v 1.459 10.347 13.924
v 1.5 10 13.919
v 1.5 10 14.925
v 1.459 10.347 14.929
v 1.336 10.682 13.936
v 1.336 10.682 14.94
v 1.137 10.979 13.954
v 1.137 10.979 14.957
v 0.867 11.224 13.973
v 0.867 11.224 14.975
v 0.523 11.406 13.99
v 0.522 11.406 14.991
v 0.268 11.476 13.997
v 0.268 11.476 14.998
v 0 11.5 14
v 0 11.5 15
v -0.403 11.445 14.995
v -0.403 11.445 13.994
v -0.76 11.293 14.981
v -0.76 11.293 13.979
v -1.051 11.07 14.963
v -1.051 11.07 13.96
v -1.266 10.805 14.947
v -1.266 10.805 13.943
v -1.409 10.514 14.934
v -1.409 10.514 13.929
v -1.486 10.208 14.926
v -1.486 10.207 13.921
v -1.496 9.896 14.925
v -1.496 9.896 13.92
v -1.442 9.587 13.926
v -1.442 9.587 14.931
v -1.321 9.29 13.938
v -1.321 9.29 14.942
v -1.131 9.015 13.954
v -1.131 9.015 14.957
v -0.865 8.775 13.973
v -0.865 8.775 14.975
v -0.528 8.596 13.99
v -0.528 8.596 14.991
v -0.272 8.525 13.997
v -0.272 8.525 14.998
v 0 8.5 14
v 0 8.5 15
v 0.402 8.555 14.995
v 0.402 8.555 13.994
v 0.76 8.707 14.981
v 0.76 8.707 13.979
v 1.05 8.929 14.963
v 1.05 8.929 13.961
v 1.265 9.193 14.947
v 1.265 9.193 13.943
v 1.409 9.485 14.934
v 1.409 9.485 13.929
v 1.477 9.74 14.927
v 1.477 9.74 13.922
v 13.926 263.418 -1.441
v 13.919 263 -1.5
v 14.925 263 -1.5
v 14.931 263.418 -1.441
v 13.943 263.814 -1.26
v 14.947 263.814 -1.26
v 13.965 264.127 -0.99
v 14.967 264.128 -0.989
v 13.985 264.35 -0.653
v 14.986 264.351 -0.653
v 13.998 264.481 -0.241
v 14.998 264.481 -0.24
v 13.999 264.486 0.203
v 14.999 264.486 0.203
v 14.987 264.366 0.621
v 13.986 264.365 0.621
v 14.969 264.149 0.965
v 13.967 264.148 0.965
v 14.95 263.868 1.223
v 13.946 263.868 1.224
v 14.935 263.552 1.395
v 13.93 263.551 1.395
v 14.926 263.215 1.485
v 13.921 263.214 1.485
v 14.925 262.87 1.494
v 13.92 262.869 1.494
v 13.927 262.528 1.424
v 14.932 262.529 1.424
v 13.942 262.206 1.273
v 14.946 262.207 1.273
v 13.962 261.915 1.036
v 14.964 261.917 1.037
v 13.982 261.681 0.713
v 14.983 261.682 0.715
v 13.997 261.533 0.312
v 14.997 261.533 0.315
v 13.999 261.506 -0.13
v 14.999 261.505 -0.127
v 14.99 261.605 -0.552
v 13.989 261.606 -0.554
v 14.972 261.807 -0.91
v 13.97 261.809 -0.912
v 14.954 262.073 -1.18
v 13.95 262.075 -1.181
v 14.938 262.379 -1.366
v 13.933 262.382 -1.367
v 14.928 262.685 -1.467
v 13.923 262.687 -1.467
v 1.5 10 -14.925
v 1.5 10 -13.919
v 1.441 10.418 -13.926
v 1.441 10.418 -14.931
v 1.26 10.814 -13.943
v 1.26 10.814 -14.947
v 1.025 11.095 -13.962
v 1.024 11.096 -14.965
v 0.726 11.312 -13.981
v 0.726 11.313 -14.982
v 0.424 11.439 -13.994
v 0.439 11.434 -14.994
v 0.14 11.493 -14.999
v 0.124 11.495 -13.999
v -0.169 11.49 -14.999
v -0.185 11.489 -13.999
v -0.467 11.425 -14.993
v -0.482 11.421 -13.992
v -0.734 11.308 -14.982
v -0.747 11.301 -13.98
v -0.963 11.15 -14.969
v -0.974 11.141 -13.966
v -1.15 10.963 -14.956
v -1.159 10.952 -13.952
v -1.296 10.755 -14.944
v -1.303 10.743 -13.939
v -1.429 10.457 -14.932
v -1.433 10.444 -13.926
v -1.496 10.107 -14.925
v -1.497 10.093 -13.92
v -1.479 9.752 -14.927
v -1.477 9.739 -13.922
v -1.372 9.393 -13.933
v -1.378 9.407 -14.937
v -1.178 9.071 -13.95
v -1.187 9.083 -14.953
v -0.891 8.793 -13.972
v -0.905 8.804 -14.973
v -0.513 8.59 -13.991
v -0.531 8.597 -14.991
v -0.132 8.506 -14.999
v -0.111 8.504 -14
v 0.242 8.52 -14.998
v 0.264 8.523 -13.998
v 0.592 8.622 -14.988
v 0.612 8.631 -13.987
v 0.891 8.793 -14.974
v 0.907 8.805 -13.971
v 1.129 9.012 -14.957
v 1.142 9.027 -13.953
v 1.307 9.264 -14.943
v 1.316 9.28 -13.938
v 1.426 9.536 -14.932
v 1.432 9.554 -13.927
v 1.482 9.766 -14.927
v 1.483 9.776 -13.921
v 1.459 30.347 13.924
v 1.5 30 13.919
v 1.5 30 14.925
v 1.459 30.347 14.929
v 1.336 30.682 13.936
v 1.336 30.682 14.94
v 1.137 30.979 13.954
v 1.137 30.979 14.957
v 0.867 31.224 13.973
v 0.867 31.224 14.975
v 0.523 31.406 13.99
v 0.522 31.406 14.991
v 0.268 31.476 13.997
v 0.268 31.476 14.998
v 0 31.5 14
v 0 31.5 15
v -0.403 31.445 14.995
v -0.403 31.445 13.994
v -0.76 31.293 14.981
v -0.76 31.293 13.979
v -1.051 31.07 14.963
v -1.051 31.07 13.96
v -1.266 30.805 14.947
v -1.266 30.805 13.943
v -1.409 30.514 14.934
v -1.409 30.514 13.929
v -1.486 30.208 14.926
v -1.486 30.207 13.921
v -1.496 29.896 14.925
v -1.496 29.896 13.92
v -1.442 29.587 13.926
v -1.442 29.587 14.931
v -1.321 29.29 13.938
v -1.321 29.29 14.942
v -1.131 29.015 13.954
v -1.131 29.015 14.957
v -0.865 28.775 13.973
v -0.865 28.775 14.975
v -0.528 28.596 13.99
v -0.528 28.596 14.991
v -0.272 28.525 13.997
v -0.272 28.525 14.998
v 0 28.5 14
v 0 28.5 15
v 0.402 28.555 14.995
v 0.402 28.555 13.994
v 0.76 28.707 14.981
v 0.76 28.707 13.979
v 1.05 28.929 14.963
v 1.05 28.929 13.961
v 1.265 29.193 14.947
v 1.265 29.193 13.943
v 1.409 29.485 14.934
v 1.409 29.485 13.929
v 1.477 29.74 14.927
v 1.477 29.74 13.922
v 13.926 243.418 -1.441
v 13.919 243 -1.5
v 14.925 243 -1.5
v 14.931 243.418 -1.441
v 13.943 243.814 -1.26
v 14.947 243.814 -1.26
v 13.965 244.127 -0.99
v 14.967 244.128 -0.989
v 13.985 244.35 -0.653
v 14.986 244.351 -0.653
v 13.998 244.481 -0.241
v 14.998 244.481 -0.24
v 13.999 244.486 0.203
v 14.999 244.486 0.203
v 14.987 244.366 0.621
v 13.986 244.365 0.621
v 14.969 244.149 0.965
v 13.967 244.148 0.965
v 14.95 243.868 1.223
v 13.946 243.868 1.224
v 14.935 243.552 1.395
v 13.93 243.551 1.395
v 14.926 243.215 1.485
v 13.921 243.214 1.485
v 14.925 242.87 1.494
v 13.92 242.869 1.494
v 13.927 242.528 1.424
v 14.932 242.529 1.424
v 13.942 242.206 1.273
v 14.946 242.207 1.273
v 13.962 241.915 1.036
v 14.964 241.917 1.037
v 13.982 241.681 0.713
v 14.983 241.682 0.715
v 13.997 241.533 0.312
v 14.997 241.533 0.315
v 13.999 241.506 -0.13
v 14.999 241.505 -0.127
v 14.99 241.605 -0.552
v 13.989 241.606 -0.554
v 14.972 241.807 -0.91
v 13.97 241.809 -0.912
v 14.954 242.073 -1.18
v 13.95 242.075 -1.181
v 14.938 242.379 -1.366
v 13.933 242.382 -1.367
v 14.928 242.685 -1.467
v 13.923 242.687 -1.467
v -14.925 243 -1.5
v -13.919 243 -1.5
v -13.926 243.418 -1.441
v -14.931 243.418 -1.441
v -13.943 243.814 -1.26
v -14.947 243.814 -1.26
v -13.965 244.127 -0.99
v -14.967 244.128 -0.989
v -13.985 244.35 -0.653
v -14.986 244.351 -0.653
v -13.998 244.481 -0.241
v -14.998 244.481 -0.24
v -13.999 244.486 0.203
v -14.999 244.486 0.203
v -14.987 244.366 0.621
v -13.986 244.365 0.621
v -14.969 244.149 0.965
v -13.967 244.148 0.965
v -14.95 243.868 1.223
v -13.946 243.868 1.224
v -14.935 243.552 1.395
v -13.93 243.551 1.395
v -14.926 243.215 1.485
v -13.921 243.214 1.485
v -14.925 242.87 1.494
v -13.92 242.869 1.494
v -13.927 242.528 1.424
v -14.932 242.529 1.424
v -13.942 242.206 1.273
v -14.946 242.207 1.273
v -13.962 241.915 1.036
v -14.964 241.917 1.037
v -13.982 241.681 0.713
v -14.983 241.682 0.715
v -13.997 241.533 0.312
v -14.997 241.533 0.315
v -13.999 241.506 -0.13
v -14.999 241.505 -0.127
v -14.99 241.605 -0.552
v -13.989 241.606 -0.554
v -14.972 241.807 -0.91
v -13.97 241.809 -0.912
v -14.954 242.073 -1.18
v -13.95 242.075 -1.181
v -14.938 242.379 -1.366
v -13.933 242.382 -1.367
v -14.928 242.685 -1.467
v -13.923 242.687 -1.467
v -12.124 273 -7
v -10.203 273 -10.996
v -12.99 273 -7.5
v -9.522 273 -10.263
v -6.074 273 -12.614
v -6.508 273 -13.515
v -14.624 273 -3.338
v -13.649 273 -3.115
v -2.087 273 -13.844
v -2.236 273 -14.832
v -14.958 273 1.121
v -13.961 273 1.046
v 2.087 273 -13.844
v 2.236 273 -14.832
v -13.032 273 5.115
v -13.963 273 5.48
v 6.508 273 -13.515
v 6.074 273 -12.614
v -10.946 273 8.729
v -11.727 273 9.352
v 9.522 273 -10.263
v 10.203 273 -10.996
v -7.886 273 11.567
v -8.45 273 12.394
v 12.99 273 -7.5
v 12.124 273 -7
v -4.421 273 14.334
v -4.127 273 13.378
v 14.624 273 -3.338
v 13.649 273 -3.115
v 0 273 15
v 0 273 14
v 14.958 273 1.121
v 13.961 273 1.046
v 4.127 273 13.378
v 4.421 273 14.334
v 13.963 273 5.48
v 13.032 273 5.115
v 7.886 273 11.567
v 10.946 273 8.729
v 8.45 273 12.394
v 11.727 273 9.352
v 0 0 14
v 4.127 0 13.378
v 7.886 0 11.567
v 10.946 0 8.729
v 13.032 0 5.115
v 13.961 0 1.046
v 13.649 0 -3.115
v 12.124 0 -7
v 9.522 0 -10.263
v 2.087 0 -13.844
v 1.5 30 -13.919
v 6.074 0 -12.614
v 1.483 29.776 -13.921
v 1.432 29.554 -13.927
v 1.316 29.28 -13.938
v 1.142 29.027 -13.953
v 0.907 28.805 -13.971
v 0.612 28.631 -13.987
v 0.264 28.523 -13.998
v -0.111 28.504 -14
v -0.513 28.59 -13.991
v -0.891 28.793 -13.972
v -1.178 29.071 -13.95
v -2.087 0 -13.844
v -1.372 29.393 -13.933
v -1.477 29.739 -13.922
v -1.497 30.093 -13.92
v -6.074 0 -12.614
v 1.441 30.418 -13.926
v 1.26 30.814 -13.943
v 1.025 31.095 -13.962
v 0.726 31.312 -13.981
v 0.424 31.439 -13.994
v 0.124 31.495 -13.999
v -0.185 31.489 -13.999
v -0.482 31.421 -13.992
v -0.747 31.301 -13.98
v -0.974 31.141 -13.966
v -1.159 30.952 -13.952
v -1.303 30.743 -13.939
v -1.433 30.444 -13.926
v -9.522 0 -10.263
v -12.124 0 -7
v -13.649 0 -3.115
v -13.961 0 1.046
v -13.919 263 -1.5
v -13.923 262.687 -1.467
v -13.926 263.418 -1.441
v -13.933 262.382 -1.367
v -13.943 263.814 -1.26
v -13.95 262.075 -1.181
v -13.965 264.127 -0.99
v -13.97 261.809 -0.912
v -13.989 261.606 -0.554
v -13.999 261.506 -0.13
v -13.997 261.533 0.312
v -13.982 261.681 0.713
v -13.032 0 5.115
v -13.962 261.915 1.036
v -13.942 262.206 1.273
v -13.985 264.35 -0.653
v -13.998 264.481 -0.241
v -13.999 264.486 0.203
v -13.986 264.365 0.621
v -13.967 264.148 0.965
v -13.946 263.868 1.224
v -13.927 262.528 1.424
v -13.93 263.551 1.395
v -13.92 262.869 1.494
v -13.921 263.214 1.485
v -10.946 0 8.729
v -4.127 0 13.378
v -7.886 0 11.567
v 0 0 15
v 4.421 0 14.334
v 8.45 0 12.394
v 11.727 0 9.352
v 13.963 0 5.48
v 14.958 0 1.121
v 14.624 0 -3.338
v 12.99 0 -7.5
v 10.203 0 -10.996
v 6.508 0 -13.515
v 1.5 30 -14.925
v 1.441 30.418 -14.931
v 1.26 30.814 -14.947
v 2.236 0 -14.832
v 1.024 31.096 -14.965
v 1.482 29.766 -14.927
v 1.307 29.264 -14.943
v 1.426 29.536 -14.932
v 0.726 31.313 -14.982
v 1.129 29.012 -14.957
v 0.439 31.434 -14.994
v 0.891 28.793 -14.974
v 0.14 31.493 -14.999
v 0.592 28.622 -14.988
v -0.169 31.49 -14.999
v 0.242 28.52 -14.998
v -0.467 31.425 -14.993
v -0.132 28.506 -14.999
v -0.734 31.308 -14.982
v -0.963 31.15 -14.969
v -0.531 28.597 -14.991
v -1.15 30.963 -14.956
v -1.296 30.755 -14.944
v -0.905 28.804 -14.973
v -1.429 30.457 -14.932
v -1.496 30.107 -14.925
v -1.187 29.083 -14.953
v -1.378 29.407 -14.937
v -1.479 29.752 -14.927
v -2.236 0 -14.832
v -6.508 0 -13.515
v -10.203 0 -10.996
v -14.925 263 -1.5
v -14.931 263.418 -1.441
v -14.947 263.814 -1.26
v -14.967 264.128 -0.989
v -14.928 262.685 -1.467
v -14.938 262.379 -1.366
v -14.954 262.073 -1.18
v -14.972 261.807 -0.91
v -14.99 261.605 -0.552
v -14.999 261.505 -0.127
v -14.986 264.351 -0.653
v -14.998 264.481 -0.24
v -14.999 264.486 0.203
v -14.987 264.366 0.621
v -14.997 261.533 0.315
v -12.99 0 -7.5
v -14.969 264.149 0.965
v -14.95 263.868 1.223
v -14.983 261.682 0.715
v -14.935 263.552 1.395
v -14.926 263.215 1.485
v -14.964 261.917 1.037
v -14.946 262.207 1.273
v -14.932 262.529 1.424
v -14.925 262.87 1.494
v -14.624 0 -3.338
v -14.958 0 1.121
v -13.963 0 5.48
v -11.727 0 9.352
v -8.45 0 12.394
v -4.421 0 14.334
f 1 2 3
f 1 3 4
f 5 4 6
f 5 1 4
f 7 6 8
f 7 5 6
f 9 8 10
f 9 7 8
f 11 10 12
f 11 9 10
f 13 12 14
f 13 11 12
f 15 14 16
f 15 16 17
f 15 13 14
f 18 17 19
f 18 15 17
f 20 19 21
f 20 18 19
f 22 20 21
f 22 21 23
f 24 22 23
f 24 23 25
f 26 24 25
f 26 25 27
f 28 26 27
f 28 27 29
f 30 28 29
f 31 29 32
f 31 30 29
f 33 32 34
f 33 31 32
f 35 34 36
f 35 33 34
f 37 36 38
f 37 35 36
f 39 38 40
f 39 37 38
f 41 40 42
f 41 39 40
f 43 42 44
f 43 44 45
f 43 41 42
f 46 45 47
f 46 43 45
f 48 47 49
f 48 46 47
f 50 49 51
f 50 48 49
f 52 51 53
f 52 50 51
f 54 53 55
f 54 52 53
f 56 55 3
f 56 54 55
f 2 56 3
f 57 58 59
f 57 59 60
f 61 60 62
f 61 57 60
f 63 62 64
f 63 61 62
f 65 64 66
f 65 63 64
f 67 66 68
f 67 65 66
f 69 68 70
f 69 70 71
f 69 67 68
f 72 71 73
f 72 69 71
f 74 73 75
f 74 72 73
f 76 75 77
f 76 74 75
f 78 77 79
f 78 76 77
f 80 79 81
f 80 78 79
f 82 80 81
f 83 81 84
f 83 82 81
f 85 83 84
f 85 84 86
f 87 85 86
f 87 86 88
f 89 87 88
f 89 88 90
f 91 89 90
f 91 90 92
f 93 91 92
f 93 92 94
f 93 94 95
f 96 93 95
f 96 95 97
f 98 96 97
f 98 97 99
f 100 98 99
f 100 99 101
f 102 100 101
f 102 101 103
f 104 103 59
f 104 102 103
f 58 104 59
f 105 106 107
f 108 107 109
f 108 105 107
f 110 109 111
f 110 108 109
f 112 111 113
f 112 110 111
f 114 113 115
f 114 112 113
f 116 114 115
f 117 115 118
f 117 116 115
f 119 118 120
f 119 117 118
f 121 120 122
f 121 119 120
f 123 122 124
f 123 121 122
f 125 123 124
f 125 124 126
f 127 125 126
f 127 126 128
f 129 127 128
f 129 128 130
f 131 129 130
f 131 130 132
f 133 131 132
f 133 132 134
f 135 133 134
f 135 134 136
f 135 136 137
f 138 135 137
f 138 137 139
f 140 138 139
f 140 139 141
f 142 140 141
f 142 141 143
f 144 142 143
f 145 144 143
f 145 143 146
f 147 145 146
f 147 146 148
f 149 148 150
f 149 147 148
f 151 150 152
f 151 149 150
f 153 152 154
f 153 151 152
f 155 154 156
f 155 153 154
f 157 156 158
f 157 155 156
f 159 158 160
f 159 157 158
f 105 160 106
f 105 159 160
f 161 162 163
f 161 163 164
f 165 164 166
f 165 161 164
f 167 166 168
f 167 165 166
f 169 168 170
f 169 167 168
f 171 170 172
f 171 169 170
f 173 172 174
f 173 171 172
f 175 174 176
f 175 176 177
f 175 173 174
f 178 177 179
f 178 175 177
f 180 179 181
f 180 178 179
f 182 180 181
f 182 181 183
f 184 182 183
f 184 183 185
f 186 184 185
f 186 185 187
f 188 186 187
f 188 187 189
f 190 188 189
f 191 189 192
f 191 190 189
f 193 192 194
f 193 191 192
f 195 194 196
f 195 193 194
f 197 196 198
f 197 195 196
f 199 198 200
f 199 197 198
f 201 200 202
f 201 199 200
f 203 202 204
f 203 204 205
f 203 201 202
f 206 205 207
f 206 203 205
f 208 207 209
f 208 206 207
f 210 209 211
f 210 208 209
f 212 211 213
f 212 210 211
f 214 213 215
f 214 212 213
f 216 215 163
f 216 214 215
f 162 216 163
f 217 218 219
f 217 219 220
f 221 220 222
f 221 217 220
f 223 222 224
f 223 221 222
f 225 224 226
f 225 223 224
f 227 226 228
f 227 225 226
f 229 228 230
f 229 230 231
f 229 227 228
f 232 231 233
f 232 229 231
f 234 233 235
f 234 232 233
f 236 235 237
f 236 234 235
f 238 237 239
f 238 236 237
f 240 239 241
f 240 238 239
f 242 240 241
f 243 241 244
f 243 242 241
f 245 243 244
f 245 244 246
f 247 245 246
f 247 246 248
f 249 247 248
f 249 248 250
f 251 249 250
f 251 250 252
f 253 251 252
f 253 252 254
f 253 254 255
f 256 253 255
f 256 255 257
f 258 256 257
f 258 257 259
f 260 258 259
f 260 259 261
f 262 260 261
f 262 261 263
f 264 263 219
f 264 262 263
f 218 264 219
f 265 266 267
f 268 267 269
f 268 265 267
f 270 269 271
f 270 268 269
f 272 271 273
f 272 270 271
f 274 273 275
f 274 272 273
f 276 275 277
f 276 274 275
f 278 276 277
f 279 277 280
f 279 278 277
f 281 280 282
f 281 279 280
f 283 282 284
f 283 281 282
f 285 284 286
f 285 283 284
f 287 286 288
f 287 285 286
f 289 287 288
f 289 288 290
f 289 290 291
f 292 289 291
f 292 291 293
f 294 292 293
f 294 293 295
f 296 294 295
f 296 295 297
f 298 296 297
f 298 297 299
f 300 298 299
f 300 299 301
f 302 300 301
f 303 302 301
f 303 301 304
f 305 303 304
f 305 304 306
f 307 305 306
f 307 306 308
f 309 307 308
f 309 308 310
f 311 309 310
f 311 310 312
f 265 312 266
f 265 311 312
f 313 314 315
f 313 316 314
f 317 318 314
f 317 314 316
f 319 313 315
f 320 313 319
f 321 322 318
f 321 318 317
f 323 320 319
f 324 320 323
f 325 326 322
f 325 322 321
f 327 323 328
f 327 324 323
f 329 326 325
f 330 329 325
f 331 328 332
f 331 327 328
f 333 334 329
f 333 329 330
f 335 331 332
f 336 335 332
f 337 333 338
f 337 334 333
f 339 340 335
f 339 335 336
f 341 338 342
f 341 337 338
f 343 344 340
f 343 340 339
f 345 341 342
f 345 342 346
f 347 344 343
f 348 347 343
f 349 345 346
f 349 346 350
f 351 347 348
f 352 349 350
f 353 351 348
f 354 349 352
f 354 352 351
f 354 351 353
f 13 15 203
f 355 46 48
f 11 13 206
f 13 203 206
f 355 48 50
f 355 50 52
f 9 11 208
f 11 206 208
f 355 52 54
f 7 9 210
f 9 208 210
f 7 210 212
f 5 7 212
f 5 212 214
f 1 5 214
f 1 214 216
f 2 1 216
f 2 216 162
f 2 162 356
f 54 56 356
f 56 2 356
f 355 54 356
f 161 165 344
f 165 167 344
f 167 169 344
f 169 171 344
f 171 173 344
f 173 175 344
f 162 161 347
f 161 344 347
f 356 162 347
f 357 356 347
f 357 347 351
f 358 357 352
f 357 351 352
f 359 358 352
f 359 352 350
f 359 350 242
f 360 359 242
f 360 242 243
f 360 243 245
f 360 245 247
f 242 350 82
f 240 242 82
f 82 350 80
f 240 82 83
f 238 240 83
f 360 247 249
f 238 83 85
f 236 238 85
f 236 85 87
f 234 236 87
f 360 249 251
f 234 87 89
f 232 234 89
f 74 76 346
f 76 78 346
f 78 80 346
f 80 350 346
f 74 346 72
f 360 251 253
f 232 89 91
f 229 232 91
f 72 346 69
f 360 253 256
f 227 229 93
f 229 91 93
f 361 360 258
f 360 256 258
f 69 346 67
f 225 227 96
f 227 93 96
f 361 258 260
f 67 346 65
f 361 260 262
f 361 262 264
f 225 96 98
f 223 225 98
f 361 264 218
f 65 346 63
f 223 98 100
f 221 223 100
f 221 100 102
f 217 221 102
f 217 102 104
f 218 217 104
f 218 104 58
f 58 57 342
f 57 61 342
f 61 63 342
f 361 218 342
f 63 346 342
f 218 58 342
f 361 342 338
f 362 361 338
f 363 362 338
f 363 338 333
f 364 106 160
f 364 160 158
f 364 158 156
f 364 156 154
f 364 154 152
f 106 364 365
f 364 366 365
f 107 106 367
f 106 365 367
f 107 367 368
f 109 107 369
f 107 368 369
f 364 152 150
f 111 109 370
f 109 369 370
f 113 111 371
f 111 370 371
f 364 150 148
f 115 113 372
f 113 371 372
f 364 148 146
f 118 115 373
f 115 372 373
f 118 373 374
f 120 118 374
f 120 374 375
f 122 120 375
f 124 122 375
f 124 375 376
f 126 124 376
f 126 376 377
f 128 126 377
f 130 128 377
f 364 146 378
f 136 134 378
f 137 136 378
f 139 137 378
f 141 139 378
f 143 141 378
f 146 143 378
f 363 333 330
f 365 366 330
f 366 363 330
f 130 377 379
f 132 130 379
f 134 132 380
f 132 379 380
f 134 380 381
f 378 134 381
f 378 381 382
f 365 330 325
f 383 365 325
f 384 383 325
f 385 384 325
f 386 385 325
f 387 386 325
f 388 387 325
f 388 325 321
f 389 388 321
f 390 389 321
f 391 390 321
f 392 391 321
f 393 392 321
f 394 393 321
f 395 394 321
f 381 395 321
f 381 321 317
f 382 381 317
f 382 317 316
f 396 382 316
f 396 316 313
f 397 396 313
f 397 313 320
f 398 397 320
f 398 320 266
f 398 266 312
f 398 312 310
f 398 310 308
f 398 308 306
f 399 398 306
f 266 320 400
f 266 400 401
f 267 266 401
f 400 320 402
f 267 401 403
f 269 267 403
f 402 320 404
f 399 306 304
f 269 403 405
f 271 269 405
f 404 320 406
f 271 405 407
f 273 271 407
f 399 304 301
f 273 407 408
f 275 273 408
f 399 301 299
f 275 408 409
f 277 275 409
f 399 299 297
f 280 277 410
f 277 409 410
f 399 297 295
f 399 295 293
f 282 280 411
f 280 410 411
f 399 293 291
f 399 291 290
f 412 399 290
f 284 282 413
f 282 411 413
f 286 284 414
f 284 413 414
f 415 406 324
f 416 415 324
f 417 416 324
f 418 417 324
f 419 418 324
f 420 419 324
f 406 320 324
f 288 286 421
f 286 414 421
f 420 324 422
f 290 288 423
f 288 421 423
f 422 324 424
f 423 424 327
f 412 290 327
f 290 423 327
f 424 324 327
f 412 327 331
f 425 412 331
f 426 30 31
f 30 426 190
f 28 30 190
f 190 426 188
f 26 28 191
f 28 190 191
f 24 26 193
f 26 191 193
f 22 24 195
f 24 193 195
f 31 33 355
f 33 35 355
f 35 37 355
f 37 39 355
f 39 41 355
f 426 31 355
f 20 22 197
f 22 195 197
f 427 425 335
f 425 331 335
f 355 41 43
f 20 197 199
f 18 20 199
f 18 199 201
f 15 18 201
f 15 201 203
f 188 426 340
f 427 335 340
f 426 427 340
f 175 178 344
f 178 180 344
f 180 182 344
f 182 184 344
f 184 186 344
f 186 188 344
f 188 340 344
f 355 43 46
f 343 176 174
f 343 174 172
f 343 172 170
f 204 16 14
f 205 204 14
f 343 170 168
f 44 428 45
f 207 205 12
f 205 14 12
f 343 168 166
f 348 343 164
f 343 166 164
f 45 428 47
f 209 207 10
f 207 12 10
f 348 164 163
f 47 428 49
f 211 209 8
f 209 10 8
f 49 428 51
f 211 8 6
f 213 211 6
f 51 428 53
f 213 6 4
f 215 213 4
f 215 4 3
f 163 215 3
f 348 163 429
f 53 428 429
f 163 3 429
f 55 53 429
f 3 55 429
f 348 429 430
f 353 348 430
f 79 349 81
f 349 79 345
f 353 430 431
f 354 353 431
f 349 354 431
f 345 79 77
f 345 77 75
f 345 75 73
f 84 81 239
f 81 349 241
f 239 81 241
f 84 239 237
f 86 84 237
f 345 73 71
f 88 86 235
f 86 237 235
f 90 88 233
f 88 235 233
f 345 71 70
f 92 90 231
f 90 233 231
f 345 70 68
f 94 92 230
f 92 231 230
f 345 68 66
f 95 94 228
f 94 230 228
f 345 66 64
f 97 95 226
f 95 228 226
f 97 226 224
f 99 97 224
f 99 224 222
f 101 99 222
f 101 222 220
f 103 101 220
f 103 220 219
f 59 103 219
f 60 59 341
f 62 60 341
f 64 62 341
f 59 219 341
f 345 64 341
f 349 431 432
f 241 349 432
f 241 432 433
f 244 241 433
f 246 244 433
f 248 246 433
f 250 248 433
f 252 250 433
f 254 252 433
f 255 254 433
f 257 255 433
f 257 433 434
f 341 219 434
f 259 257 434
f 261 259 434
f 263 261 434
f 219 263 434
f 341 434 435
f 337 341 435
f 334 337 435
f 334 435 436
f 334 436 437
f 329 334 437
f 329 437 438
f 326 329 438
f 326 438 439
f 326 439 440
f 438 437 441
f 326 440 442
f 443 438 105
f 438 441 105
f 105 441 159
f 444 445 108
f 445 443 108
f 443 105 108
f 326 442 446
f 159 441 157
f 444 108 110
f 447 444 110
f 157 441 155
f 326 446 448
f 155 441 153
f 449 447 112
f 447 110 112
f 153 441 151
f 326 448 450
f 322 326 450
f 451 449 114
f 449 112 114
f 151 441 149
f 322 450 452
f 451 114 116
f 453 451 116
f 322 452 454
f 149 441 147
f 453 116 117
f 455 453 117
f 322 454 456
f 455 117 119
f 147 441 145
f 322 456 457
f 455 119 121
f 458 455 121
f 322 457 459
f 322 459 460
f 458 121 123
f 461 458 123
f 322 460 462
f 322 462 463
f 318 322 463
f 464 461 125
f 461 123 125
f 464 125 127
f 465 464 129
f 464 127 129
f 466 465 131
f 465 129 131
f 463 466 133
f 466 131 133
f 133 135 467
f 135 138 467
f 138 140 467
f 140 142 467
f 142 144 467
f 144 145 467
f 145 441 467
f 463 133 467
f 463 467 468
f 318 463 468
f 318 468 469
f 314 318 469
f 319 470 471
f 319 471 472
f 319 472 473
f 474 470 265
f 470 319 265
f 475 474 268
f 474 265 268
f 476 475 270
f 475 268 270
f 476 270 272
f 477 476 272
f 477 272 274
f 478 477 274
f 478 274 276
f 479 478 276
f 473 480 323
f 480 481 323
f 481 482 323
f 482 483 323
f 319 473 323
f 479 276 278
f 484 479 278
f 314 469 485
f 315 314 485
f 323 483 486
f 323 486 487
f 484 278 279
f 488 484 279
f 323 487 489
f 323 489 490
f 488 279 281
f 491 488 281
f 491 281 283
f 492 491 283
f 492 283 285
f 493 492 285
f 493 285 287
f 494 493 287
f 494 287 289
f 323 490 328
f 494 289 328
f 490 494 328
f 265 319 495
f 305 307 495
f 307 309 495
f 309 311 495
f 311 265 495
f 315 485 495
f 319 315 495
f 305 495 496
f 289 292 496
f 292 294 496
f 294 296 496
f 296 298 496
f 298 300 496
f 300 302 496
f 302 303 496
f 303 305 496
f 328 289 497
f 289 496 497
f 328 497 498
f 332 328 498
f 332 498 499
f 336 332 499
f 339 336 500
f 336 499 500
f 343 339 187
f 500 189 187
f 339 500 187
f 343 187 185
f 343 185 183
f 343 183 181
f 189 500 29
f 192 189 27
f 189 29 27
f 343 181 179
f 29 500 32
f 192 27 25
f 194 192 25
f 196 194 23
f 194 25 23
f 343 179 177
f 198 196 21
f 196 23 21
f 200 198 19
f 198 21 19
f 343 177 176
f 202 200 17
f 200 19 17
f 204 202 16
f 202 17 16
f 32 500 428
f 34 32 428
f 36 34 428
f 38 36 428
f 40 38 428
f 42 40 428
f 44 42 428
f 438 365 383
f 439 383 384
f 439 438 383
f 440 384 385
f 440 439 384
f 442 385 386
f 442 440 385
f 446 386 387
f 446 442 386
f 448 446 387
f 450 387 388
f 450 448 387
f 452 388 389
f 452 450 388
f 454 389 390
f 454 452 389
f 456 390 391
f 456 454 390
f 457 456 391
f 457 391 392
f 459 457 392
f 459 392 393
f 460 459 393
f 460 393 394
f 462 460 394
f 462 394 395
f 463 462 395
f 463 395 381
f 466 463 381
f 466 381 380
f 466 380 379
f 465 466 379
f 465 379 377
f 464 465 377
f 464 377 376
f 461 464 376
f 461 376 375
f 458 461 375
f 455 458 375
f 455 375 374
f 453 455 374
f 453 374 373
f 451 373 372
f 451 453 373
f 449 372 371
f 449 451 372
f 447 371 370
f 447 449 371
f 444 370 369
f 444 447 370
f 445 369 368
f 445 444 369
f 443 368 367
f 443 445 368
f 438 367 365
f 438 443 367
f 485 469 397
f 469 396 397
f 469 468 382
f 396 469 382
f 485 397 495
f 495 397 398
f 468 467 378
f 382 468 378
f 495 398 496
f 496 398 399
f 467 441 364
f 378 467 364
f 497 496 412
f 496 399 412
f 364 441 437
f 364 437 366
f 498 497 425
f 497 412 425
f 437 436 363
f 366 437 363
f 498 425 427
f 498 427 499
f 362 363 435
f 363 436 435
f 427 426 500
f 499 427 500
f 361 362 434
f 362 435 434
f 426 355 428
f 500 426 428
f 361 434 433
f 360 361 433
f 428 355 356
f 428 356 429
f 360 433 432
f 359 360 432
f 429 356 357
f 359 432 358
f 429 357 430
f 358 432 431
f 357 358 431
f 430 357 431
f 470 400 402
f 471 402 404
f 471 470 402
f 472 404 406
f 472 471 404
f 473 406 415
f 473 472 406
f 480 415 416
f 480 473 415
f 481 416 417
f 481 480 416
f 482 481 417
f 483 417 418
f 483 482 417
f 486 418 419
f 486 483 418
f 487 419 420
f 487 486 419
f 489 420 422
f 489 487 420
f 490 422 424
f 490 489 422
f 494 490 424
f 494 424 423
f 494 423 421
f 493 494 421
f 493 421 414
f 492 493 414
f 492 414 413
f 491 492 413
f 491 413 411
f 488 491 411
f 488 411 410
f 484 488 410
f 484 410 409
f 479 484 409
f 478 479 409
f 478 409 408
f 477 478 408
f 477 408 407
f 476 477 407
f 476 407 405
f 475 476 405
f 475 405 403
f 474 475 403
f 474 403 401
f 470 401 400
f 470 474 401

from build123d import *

# Parameters (mm, degrees)
SKETCH_1_R               = 15
EXTRUDE_1_DEPTH          = 273
CUT_EXTRUDE_1_DEPTH      = 274.822935489
CUT_EXTRUDE_1_DEPTH_BACK = 274.822935489
SKETCH_2_R               = 1.5
CUT_EXTRUDE_2_DEPTH      = 274.8229356
CUT_EXTRUDE_2_DEPTH_BACK = 274.8229356
SKETCH_3_R               = 1.5
CUT_EXTRUDE_3_REACH      = 275.823
SKETCH_4_R               = 14


with BuildPart() as part:
    # 草圖1 → 填料-伸長1 (new body)
    with BuildSketch(Plane(origin=(0, 0, 0), x_dir=(1, 0, 0), z_dir=(0, 1, 0))):
        with Locations(Location((0, 0, 0), (0, 0, 270))):
            Circle(SKETCH_1_R)
    extrude(amount=EXTRUDE_1_DEPTH)

    # 草圖2 → 除料-伸長1 (cut, two sides: drawn at the far end of the back side and taken through both)
    with BuildSketch(Plane.XY.offset(-CUT_EXTRUDE_1_DEPTH_BACK)):
        with Locations((0, 10)):
            Circle(SKETCH_2_R)
        with Locations((0, 30)):
            Circle(SKETCH_2_R)
    extrude(amount=CUT_EXTRUDE_1_DEPTH + CUT_EXTRUDE_1_DEPTH_BACK, mode=Mode.SUBTRACT)

    # 草圖3 → 除料-伸長2 (cut, two sides: drawn at the far end of the back side and taken through both)
    with BuildSketch(Plane(origin=(0, 0, 0), x_dir=(0, 0, -1), z_dir=(1, 0, 0)).offset(-CUT_EXTRUDE_2_DEPTH_BACK)):
        with Locations((0, 263)):
            Circle(SKETCH_3_R)
        with Locations((0, 243)):
            Circle(SKETCH_3_R)
    extrude(amount=CUT_EXTRUDE_2_DEPTH + CUT_EXTRUDE_2_DEPTH_BACK, mode=Mode.SUBTRACT)

    # 草圖4 → 除料-伸長3 (cut, up to next)
    with BuildSketch(Plane(origin=(0, 273, 0), x_dir=(1, 0, 0), z_dir=(0, 1, 0)), mode=Mode.PRIVATE) as cut_extrude_3_sk1:
        with Locations(Location((0, 0, 0), (0, 0, 270))):
            Circle(SKETCH_4_R)
    cut_extrude_3_tool1 = extrude(cut_extrude_3_sk1.sketch, amount=-CUT_EXTRUDE_3_REACH, mode=Mode.PRIVATE) & part.part
    add(cut_extrude_3_tool1.solids().sort_by_distance((0, 273, 0))[0], mode=Mode.SUBTRACT)


solid = part.part
